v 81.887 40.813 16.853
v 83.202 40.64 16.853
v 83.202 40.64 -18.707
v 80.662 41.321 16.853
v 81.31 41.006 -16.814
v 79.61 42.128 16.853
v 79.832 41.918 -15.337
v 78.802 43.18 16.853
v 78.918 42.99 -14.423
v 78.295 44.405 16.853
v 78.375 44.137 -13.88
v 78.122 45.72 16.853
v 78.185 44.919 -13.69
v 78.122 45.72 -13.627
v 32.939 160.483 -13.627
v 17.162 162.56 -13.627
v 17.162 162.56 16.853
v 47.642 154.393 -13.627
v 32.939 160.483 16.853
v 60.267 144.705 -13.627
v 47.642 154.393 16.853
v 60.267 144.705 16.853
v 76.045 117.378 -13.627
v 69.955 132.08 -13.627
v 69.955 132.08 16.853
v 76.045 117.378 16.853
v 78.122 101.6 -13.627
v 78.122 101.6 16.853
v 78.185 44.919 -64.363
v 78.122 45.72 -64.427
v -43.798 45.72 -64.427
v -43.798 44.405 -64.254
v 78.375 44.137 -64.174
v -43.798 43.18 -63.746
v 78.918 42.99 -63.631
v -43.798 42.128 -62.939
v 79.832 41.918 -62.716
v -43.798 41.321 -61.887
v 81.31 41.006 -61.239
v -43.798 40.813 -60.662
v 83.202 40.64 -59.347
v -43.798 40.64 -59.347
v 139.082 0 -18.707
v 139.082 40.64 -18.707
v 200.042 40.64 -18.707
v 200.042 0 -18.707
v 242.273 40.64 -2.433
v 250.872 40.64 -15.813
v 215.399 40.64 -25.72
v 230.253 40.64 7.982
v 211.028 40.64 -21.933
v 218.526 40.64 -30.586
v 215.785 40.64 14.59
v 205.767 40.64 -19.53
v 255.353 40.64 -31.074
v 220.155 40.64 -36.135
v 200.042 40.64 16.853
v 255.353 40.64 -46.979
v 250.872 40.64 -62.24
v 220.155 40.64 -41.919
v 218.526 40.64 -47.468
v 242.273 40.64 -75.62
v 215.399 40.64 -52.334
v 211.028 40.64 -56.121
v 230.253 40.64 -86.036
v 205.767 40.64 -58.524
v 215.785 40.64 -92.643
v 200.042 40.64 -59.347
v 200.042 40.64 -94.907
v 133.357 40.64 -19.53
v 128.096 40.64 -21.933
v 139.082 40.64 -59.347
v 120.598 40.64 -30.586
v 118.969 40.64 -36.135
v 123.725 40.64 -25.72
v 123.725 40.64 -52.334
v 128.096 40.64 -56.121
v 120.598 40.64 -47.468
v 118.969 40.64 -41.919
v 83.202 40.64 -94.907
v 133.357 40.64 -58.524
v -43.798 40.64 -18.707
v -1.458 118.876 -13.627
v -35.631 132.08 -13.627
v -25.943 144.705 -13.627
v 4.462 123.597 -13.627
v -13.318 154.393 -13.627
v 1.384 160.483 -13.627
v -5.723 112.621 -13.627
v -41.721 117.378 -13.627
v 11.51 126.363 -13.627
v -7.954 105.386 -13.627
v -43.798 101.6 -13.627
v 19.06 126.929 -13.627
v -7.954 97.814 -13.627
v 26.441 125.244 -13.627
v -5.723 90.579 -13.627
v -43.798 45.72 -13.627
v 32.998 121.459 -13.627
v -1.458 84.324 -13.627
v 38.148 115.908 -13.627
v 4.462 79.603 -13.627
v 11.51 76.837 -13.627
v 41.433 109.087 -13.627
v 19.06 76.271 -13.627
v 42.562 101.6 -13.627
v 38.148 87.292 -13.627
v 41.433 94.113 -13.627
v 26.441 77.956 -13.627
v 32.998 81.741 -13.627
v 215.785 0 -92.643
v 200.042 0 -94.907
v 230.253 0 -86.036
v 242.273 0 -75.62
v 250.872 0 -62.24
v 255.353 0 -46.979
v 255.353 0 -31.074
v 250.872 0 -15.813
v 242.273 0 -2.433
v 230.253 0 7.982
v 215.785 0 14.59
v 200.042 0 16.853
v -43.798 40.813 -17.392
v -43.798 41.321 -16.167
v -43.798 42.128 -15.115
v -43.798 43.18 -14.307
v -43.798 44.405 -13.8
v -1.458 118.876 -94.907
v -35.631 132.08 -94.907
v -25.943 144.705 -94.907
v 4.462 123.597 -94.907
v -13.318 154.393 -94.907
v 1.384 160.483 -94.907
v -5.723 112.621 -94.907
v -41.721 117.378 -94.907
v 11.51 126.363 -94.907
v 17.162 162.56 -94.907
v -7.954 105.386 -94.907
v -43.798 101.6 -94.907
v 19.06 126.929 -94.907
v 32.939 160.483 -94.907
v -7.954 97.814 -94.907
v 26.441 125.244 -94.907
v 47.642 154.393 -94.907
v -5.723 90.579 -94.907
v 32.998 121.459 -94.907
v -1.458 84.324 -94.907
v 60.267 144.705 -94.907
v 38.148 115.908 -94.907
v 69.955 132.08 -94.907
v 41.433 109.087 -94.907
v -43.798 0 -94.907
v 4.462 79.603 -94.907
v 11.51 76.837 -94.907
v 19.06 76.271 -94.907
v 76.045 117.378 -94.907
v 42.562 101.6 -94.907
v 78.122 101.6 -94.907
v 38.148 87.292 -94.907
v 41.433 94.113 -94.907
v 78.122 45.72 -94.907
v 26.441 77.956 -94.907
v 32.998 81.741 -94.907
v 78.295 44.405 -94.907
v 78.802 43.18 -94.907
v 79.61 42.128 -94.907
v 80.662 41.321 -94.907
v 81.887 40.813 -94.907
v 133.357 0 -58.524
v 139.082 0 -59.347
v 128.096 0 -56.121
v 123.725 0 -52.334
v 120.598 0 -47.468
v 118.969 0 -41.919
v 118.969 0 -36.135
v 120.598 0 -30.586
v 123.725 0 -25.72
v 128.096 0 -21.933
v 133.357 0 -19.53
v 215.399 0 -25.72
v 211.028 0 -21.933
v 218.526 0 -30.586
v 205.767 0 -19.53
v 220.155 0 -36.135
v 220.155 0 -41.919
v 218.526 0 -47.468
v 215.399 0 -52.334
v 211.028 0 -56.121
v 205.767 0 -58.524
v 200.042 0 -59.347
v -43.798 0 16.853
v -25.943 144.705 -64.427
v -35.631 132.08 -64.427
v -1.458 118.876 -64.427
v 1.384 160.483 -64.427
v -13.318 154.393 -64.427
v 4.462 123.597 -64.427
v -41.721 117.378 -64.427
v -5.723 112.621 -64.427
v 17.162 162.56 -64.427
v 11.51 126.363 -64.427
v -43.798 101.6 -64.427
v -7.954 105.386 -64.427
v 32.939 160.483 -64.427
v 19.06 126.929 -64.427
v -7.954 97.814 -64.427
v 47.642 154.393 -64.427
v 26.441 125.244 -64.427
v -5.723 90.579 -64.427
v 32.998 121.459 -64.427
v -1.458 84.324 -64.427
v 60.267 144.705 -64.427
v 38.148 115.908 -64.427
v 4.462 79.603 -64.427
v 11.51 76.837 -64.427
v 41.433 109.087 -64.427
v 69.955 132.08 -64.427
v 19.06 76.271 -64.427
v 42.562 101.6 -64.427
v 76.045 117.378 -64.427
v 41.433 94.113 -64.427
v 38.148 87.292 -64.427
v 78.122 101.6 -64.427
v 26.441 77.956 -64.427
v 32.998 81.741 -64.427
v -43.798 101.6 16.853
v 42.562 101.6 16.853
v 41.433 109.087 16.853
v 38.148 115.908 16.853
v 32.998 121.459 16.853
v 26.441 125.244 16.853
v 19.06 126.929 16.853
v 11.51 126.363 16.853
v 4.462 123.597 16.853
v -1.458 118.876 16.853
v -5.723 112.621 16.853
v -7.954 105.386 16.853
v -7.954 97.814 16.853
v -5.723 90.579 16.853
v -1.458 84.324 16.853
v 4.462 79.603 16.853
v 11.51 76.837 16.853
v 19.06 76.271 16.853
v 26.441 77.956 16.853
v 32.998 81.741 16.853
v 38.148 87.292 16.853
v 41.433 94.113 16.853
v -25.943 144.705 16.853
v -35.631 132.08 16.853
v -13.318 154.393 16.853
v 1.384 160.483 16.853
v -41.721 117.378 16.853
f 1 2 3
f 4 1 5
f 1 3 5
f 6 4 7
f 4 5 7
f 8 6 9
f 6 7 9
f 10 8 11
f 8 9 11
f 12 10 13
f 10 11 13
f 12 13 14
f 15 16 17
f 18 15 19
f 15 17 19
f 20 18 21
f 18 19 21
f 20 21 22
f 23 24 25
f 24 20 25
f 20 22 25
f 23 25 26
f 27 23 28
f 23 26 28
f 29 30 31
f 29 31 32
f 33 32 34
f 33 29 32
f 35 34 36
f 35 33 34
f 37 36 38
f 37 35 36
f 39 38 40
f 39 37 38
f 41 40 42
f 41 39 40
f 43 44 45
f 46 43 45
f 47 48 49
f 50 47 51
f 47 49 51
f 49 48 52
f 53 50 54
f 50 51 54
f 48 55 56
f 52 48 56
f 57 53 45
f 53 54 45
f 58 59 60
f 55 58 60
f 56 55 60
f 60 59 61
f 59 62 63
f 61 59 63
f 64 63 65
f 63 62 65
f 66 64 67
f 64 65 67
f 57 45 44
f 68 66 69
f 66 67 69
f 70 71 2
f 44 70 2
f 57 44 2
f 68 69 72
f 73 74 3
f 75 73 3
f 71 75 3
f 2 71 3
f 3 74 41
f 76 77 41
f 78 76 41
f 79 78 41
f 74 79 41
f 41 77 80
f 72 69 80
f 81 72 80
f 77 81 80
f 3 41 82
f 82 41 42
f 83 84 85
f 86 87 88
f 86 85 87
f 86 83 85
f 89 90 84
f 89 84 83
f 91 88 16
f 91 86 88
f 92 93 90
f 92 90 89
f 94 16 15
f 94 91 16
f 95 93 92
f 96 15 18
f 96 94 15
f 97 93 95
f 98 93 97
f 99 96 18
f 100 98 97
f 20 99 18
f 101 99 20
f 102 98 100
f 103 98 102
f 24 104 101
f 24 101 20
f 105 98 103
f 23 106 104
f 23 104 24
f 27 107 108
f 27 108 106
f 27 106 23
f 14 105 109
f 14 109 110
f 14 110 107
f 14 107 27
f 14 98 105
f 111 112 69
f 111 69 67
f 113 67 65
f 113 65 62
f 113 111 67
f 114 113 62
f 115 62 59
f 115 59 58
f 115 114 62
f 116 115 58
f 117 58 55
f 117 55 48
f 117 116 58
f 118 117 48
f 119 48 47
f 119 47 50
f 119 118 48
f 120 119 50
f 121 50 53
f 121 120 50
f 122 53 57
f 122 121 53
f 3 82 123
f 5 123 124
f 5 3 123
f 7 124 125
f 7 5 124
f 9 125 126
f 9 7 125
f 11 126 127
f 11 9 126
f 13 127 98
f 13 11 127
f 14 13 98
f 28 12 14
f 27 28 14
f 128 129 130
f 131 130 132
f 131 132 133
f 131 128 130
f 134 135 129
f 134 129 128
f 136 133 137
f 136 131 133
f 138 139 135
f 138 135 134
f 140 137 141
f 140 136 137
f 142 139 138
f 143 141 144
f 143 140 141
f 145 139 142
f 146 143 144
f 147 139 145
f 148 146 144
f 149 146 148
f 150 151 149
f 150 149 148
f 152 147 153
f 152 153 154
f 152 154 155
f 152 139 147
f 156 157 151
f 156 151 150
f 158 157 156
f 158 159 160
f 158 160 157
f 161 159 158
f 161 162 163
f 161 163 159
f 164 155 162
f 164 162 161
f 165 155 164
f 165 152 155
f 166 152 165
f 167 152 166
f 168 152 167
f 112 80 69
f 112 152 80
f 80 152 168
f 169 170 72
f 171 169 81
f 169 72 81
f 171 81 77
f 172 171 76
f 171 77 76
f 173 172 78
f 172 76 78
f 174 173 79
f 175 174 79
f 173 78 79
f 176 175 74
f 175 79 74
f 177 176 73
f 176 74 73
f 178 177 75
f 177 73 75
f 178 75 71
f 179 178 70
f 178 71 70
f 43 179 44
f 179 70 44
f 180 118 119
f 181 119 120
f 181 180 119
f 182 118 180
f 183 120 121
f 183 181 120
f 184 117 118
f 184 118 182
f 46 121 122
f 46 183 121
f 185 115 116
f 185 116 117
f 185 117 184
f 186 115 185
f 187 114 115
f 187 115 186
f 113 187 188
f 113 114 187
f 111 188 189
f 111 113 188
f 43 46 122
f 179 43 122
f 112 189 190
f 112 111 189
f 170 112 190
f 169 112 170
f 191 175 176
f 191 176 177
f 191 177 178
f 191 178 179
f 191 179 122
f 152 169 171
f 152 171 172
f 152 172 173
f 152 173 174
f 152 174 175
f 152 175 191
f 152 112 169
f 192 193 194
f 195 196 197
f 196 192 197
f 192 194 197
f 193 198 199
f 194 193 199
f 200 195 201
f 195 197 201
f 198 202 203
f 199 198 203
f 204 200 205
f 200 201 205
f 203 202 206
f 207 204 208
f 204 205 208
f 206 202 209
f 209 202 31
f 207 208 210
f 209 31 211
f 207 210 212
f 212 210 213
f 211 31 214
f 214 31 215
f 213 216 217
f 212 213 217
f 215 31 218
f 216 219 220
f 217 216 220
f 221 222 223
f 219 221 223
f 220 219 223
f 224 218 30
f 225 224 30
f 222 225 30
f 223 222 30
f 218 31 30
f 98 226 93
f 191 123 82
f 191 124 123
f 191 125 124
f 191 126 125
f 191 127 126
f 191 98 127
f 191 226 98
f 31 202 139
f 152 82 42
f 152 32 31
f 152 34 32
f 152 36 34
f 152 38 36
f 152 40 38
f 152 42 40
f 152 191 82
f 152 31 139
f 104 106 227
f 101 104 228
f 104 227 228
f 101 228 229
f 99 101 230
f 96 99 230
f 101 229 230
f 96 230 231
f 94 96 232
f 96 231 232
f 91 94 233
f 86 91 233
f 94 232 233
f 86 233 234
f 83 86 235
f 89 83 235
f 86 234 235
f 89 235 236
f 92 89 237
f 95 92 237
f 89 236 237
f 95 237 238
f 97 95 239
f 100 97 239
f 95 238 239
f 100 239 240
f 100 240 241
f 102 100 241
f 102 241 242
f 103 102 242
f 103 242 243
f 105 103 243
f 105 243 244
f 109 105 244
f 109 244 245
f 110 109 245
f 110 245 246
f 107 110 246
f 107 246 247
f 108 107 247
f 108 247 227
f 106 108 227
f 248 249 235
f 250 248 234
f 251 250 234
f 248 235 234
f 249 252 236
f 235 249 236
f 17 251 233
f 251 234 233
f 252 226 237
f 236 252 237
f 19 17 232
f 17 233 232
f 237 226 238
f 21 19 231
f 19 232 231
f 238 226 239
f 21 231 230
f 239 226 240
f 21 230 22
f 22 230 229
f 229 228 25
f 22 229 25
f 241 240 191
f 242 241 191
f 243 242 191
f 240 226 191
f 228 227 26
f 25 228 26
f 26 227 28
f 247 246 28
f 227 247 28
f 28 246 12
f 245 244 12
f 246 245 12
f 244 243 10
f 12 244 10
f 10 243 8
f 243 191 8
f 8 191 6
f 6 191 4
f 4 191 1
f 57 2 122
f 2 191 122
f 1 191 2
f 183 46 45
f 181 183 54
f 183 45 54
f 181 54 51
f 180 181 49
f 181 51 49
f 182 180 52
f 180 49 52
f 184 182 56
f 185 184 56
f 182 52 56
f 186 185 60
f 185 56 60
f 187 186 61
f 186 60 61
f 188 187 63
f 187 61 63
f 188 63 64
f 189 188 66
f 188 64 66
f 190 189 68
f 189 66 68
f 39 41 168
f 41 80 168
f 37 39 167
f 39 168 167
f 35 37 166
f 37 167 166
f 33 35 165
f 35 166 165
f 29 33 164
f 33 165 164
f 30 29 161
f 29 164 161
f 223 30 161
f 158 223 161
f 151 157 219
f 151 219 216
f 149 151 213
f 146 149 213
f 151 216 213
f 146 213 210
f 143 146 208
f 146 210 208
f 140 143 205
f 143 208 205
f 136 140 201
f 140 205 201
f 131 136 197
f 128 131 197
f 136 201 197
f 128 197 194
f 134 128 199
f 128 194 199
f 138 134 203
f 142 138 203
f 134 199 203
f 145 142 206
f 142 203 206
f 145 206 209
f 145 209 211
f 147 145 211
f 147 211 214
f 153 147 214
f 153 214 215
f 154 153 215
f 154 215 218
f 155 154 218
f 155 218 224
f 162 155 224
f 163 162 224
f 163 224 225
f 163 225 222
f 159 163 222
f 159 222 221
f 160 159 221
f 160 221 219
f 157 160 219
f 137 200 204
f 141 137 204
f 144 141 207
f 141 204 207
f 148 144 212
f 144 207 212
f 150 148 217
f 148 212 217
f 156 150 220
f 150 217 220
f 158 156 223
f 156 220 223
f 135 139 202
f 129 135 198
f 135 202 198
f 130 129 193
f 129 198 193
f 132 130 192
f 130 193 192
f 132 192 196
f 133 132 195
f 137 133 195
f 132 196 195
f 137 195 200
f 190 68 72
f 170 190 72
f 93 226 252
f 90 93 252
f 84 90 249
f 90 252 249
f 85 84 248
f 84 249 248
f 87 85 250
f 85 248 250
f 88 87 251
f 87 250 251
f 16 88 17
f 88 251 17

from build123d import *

# Parameters (mm, degrees)
BOSS_EXTRUDE1_DEPTH = 40.64
SKETCH2_W           = 121.92
SKETCH2_H           = 30.48
BOSS_EXTRUDE3_DEPTH = 121.92
CUT_EXTRUDE1_DEPTH  = 40.64
CUT_EXTRUDE3_DEPTH  = 111.76
SKETCH5_5_R         = 25.4
CUT_EXTRUDE4_DEPTH  = 111.76
FILLET1_R           = 5.08


with BuildPart() as part:
    # Sketch1 → Boss-Extrude1 (new body)
    with BuildSketch(Plane(origin=(0, 0, 0), x_dir=(1, 0, 0), z_dir=(0, 1, 0))):
        with BuildLine():
            Line((-43.798165138, 94.906788991), (200.041834862, 94.906788991))
            ThreePointArc((200.041834862, 94.906788991), (255.921834862, 39.026788991), (200.041834862, -16.853211009))
            Line((200.041834862, -16.853211009), (-43.798165138, -16.853211009))
            Line((-43.798165138, -16.853211009), (-43.798165138, 94.906788991))
        make_face()
    extrude(amount=BOSS_EXTRUDE1_DEPTH)

    # Sketch2 → Boss-Extrude3 (add)
    with BuildSketch(Plane(origin=(0, 40.64, 0), x_dir=(1, 0, 0), z_dir=(0, 1, 0))):
        with Locations((17.161834862, -1.613211009)):
            Rectangle(SKETCH2_W, SKETCH2_H)
        with Locations((17.161834862, 79.666788991)):
            Rectangle(SKETCH2_W, SKETCH2_H)
    extrude(amount=BOSS_EXTRUDE3_DEPTH)

    # Sketch2<6> → Cut-Extrude1 (cut)
    with BuildSketch(Plane(origin=(0, 40.64, 0), x_dir=(1, 0, 0), z_dir=(0, 1, 0))):
        with BuildLine():
            Line((200.041834862, 59.346788991), (139.081834862, 59.346788991))
            ThreePointArc((139.081834862, 59.346788991), (118.761834862, 39.026788991), (139.081834862, 18.706788991))
            Line((139.081834862, 18.706788991), (200.041834862, 18.706788991))
            ThreePointArc((200.041834862, 18.706788991), (220.361834862, 39.026788991), (200.041834862, 59.346788991))
        make_face()
    extrude(amount=-CUT_EXTRUDE1_DEPTH, mode=Mode.SUBTRACT)

    # Sketch5 → Cut-Extrude3 (cut)
    with BuildSketch(Plane.XY.offset(16.853211009)):
        with BuildLine():
            Line((78.121834862, 162.56), (17.161834862, 162.56))
            ThreePointArc((17.161834862, 162.56), (60.267064244, 144.705229381), (78.121834862, 101.6))
            Line((78.121834862, 101.6), (78.121834862, 162.56))
        make_face()
        with BuildLine():
            Line((-43.798165138, 162.56), (-43.798165138, 101.6))
            ThreePointArc((-43.798165138, 101.6), (-25.943394519, 144.705229381), (17.161834862, 162.56))
            Line((17.161834862, 162.56), (-43.798165138, 162.56))
        make_face()
    extrude(amount=-CUT_EXTRUDE3_DEPTH, mode=Mode.SUBTRACT)

    # Sketch5<5> → Cut-Extrude4 (cut)
    with BuildSketch(Plane.XY.offset(16.853211009)):
        with Locations((17.161834862, 101.6)):
            Circle(SKETCH5_5_R)
    extrude(amount=-CUT_EXTRUDE4_DEPTH, mode=Mode.SUBTRACT)

    # Fillet1
    fillet1_edges = [part.edges().sort_by_distance(p)[0] for p in [
        (17.161834862, 40.64, -13.626788991),
        (78.121834862, 40.64, 1.613211009),
        (78.121834862, 40.64, -79.666788991),
        (17.161834862, 40.64, -64.426788991),
    ]]
    fillet(fillet1_edges, radius=FILLET1_R)


solid = part.part
